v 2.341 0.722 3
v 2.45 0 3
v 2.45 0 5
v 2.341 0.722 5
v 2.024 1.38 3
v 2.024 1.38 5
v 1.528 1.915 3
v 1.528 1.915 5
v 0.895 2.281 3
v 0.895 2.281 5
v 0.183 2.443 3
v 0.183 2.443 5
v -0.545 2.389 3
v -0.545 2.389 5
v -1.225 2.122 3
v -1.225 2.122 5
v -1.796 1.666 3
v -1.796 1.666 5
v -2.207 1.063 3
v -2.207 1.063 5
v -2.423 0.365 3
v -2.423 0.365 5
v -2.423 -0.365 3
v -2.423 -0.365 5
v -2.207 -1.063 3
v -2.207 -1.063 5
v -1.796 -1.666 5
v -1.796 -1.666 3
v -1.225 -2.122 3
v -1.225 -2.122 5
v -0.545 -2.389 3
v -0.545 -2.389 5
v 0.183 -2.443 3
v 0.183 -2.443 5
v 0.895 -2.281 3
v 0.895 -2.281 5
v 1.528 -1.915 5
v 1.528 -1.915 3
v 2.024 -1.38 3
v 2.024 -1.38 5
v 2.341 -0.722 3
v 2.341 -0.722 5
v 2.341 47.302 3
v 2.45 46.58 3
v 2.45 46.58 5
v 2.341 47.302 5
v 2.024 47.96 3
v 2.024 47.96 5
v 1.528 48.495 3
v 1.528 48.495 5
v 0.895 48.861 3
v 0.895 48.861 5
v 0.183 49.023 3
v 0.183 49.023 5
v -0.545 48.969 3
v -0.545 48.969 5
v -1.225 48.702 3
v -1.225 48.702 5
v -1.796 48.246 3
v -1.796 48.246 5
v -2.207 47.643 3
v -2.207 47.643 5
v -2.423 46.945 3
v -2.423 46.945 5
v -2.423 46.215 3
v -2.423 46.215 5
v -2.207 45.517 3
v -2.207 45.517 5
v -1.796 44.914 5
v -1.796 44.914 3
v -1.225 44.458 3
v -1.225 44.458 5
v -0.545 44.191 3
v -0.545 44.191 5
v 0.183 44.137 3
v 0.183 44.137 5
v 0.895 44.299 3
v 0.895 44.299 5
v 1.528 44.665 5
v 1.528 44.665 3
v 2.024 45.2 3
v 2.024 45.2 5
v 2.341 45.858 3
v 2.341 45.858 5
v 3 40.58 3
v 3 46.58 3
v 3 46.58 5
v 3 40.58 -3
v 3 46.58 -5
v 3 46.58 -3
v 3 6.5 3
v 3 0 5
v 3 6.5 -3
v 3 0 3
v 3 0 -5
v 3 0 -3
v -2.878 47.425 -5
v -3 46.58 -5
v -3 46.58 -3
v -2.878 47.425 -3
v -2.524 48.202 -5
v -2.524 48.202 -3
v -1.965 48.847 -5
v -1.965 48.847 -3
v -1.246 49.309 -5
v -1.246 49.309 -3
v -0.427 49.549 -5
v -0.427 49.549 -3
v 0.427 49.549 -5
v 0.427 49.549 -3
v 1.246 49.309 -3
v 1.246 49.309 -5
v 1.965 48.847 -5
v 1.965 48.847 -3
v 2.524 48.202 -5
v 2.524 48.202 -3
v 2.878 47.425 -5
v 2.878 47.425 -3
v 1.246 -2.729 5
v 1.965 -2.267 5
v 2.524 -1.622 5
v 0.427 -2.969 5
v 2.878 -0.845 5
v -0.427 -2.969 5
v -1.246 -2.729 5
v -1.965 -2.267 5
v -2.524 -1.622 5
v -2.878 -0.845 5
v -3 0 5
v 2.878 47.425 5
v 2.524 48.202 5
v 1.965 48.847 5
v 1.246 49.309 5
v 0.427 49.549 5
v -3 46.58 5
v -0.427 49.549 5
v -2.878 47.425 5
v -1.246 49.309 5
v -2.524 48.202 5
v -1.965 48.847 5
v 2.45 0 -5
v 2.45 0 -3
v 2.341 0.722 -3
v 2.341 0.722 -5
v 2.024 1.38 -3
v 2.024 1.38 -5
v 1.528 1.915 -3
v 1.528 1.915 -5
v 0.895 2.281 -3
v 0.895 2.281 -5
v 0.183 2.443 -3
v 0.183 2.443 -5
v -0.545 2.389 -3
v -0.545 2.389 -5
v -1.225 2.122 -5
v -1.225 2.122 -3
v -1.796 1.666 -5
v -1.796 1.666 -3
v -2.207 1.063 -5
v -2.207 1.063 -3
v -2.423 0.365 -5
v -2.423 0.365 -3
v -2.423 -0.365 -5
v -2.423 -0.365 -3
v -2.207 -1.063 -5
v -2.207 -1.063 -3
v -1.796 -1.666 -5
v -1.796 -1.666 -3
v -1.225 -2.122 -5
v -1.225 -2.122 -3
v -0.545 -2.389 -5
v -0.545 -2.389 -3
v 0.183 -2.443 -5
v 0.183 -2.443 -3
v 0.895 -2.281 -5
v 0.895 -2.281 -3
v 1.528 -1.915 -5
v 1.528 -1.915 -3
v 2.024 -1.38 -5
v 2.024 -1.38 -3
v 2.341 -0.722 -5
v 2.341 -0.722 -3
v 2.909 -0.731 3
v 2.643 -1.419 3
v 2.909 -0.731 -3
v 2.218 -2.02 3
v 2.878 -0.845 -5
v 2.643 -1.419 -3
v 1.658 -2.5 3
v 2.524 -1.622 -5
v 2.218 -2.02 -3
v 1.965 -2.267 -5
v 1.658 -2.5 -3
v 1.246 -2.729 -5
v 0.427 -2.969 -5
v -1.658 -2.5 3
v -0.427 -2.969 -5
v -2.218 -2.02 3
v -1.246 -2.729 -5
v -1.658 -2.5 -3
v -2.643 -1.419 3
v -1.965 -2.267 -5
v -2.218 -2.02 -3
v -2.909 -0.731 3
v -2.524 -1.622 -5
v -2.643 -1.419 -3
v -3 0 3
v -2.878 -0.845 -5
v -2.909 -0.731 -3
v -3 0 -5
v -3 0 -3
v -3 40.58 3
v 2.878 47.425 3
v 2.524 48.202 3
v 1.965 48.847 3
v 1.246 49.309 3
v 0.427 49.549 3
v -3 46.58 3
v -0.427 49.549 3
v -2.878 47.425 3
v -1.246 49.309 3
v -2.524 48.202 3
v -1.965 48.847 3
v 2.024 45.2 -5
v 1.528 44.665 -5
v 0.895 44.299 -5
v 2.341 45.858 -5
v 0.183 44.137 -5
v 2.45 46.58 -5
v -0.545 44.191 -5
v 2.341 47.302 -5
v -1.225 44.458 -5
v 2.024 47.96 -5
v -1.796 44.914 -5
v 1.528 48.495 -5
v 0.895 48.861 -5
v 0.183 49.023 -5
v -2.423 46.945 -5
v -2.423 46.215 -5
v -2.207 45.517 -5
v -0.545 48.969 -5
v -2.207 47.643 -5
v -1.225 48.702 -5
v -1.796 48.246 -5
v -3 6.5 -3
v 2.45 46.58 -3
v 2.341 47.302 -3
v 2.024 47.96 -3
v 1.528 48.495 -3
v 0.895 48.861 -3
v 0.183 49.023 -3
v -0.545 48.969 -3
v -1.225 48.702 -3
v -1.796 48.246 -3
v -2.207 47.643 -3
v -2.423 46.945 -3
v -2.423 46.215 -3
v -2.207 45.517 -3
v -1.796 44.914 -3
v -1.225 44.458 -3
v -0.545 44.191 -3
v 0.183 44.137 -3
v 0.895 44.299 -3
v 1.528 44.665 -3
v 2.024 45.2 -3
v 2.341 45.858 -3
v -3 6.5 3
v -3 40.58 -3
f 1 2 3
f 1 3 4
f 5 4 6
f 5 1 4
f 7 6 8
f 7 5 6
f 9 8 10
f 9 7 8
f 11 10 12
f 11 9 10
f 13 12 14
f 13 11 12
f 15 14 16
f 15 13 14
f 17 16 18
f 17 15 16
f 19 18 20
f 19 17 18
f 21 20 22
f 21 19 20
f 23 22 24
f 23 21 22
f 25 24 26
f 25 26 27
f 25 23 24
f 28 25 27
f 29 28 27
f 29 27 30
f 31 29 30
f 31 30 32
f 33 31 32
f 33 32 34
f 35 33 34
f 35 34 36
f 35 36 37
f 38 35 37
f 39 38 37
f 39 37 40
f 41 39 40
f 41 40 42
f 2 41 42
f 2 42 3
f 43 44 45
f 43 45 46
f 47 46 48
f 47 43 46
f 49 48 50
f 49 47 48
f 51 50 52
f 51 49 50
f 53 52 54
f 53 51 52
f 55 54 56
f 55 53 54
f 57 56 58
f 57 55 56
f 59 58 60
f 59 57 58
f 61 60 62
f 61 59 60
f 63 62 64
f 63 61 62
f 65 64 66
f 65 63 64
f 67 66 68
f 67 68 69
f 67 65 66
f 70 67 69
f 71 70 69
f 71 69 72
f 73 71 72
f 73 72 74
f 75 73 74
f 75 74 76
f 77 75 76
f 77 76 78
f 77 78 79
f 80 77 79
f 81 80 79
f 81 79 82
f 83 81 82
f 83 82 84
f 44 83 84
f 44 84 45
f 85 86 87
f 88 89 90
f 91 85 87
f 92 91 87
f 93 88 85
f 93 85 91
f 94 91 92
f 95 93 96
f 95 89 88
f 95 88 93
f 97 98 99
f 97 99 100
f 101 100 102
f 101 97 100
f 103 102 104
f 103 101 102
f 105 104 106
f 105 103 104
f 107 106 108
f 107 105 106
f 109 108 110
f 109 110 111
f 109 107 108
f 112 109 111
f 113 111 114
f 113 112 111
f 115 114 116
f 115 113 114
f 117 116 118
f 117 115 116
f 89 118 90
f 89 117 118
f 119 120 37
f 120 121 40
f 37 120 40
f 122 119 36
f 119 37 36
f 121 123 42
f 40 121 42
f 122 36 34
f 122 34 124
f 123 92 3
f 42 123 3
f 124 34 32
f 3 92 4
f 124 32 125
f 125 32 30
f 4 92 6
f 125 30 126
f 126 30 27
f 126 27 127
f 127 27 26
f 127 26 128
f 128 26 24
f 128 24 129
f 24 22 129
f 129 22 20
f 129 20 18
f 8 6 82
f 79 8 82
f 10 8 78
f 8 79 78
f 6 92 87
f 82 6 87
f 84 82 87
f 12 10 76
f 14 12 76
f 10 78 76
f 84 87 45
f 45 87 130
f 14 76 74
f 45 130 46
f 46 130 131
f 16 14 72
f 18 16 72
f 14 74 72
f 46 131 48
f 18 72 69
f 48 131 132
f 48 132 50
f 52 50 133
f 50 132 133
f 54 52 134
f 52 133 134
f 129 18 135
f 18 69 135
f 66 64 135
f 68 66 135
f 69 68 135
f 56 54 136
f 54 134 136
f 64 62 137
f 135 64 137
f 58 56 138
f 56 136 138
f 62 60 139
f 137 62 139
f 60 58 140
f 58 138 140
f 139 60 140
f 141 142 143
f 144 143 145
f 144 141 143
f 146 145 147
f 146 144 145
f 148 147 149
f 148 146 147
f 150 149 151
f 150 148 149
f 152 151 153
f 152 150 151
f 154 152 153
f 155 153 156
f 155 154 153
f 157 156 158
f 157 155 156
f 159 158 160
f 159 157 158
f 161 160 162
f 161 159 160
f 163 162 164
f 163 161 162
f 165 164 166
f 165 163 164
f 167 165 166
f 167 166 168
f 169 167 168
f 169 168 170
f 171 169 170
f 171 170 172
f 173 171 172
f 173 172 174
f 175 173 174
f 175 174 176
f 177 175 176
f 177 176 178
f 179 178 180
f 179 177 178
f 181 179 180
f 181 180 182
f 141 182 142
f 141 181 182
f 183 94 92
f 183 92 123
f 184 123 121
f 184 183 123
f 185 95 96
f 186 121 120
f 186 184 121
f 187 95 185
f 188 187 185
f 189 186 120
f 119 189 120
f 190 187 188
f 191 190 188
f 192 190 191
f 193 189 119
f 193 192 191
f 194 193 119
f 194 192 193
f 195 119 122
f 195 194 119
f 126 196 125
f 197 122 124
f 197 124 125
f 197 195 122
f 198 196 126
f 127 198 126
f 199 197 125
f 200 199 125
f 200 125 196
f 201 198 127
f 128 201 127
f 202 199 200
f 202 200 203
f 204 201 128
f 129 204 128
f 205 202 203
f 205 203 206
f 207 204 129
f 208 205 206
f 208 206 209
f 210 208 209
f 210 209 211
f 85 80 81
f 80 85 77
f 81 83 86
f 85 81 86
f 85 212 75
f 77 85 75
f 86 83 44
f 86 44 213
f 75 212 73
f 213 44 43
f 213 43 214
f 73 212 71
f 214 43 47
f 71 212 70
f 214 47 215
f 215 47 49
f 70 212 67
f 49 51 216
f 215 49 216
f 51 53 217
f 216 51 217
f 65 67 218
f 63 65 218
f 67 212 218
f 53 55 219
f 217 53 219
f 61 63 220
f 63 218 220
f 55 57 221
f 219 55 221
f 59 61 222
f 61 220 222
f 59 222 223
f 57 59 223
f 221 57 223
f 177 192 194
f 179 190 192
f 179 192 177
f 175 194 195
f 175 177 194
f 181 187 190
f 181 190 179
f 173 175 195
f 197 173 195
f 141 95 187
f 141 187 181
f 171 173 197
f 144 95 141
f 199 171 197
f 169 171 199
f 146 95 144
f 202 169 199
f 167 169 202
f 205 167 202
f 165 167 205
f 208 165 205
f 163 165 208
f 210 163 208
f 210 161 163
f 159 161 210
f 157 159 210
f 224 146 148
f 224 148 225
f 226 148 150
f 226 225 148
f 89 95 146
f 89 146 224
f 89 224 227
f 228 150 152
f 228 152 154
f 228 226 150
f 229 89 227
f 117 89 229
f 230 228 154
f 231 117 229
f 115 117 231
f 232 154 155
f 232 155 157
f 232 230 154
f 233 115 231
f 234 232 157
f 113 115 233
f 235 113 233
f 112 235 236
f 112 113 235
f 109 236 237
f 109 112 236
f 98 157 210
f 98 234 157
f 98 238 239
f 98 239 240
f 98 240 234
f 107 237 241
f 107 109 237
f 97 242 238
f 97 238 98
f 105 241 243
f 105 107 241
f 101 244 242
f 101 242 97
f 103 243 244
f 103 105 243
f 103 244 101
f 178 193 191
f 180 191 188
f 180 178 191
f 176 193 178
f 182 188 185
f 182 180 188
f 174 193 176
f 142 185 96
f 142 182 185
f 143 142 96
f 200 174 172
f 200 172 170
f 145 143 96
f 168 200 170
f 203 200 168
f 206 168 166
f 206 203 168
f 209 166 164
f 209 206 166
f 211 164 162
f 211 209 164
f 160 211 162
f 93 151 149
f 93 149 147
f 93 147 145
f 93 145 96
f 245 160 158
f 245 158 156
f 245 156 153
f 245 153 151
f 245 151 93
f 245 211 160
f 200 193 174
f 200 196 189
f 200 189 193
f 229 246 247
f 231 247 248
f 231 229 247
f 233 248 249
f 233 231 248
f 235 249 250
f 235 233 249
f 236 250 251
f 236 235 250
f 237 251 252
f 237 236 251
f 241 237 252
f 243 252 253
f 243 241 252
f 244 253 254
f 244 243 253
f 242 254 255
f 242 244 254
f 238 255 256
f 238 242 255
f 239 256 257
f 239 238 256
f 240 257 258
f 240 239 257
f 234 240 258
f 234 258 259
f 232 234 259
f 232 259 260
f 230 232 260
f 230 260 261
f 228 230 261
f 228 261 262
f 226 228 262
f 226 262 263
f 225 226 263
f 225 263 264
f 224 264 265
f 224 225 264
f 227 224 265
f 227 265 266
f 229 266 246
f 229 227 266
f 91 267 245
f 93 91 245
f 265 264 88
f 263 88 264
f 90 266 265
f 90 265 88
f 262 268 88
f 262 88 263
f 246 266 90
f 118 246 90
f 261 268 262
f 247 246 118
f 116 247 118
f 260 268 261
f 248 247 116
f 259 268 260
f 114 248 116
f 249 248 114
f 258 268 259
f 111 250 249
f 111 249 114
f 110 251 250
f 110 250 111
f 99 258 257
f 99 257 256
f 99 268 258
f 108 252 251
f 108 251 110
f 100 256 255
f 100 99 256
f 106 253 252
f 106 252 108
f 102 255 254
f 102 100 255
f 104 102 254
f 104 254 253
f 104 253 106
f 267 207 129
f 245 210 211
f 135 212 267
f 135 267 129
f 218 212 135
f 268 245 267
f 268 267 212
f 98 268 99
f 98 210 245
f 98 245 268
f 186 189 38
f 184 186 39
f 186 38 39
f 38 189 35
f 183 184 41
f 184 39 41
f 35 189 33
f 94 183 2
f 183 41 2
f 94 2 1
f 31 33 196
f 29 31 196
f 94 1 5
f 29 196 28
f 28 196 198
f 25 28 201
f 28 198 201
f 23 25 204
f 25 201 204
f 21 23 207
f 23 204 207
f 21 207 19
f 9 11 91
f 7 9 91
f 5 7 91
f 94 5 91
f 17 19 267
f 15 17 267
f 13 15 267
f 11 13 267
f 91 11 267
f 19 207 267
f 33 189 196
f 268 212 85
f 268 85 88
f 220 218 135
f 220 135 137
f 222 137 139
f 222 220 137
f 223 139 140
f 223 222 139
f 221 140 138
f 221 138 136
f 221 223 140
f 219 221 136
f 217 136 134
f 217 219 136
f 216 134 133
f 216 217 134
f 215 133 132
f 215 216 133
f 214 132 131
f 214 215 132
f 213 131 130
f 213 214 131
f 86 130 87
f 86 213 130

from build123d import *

# Parameters (mm, degrees)
ESTRUSIONE_ESTRUSIONE1_DEPTH      = 5
ESTRUSIONE_ESTRUSIONE1_DEPTH_BACK = 5
SCHIZZO1_R                        = 2.45
TAGLIO_ESTRUSIONE1_DEPTH          = 50.921702695
TAGLIO_ESTRUSIONE1_DEPTH_BACK     = 50.921702695
SCHIZZO2_W                        = 6
SCHIZZO2_H                        = 9


with BuildPart() as part:
    # Schizzo1 → Estrusione-Estrusione1 (new, two sides: drawn at the far end of the back side and taken through both)
    with BuildSketch(Plane.XY.offset(-ESTRUSIONE_ESTRUSIONE1_DEPTH_BACK)):
        with BuildLine():
            Line((-3, 0), (-3, 46.58))
            ThreePointArc((-3, 46.58), (0, 49.58), (3, 46.58))
            Line((3, 46.58), (3, 0))
            ThreePointArc((3, 0), (0, -3), (-3, 0))
        make_face()
        Circle(SCHIZZO1_R, mode=Mode.SUBTRACT)
        with Locations((0, 46.58)):
            Circle(SCHIZZO1_R, mode=Mode.SUBTRACT)
    extrude(amount=ESTRUSIONE_ESTRUSIONE1_DEPTH + ESTRUSIONE_ESTRUSIONE1_DEPTH_BACK)

    # Schizzo2 → Taglio-Estrusione1 (cut, two sides: drawn at the far end of the back side and taken through both)
    with BuildSketch(Plane(origin=(0, 0, 0), x_dir=(0, 0, -1), z_dir=(1, 0, 0)).offset(-TAGLIO_ESTRUSIONE1_DEPTH_BACK)):
        with Locations((0, 45.08)):
            Rectangle(SCHIZZO2_W, SCHIZZO2_H)
        with Locations((0, 2)):
            Rectangle(SCHIZZO2_W, SCHIZZO2_H)
    extrude(amount=TAGLIO_ESTRUSIONE1_DEPTH + TAGLIO_ESTRUSIONE1_DEPTH_BACK, mode=Mode.SUBTRACT)


solid = part.part
